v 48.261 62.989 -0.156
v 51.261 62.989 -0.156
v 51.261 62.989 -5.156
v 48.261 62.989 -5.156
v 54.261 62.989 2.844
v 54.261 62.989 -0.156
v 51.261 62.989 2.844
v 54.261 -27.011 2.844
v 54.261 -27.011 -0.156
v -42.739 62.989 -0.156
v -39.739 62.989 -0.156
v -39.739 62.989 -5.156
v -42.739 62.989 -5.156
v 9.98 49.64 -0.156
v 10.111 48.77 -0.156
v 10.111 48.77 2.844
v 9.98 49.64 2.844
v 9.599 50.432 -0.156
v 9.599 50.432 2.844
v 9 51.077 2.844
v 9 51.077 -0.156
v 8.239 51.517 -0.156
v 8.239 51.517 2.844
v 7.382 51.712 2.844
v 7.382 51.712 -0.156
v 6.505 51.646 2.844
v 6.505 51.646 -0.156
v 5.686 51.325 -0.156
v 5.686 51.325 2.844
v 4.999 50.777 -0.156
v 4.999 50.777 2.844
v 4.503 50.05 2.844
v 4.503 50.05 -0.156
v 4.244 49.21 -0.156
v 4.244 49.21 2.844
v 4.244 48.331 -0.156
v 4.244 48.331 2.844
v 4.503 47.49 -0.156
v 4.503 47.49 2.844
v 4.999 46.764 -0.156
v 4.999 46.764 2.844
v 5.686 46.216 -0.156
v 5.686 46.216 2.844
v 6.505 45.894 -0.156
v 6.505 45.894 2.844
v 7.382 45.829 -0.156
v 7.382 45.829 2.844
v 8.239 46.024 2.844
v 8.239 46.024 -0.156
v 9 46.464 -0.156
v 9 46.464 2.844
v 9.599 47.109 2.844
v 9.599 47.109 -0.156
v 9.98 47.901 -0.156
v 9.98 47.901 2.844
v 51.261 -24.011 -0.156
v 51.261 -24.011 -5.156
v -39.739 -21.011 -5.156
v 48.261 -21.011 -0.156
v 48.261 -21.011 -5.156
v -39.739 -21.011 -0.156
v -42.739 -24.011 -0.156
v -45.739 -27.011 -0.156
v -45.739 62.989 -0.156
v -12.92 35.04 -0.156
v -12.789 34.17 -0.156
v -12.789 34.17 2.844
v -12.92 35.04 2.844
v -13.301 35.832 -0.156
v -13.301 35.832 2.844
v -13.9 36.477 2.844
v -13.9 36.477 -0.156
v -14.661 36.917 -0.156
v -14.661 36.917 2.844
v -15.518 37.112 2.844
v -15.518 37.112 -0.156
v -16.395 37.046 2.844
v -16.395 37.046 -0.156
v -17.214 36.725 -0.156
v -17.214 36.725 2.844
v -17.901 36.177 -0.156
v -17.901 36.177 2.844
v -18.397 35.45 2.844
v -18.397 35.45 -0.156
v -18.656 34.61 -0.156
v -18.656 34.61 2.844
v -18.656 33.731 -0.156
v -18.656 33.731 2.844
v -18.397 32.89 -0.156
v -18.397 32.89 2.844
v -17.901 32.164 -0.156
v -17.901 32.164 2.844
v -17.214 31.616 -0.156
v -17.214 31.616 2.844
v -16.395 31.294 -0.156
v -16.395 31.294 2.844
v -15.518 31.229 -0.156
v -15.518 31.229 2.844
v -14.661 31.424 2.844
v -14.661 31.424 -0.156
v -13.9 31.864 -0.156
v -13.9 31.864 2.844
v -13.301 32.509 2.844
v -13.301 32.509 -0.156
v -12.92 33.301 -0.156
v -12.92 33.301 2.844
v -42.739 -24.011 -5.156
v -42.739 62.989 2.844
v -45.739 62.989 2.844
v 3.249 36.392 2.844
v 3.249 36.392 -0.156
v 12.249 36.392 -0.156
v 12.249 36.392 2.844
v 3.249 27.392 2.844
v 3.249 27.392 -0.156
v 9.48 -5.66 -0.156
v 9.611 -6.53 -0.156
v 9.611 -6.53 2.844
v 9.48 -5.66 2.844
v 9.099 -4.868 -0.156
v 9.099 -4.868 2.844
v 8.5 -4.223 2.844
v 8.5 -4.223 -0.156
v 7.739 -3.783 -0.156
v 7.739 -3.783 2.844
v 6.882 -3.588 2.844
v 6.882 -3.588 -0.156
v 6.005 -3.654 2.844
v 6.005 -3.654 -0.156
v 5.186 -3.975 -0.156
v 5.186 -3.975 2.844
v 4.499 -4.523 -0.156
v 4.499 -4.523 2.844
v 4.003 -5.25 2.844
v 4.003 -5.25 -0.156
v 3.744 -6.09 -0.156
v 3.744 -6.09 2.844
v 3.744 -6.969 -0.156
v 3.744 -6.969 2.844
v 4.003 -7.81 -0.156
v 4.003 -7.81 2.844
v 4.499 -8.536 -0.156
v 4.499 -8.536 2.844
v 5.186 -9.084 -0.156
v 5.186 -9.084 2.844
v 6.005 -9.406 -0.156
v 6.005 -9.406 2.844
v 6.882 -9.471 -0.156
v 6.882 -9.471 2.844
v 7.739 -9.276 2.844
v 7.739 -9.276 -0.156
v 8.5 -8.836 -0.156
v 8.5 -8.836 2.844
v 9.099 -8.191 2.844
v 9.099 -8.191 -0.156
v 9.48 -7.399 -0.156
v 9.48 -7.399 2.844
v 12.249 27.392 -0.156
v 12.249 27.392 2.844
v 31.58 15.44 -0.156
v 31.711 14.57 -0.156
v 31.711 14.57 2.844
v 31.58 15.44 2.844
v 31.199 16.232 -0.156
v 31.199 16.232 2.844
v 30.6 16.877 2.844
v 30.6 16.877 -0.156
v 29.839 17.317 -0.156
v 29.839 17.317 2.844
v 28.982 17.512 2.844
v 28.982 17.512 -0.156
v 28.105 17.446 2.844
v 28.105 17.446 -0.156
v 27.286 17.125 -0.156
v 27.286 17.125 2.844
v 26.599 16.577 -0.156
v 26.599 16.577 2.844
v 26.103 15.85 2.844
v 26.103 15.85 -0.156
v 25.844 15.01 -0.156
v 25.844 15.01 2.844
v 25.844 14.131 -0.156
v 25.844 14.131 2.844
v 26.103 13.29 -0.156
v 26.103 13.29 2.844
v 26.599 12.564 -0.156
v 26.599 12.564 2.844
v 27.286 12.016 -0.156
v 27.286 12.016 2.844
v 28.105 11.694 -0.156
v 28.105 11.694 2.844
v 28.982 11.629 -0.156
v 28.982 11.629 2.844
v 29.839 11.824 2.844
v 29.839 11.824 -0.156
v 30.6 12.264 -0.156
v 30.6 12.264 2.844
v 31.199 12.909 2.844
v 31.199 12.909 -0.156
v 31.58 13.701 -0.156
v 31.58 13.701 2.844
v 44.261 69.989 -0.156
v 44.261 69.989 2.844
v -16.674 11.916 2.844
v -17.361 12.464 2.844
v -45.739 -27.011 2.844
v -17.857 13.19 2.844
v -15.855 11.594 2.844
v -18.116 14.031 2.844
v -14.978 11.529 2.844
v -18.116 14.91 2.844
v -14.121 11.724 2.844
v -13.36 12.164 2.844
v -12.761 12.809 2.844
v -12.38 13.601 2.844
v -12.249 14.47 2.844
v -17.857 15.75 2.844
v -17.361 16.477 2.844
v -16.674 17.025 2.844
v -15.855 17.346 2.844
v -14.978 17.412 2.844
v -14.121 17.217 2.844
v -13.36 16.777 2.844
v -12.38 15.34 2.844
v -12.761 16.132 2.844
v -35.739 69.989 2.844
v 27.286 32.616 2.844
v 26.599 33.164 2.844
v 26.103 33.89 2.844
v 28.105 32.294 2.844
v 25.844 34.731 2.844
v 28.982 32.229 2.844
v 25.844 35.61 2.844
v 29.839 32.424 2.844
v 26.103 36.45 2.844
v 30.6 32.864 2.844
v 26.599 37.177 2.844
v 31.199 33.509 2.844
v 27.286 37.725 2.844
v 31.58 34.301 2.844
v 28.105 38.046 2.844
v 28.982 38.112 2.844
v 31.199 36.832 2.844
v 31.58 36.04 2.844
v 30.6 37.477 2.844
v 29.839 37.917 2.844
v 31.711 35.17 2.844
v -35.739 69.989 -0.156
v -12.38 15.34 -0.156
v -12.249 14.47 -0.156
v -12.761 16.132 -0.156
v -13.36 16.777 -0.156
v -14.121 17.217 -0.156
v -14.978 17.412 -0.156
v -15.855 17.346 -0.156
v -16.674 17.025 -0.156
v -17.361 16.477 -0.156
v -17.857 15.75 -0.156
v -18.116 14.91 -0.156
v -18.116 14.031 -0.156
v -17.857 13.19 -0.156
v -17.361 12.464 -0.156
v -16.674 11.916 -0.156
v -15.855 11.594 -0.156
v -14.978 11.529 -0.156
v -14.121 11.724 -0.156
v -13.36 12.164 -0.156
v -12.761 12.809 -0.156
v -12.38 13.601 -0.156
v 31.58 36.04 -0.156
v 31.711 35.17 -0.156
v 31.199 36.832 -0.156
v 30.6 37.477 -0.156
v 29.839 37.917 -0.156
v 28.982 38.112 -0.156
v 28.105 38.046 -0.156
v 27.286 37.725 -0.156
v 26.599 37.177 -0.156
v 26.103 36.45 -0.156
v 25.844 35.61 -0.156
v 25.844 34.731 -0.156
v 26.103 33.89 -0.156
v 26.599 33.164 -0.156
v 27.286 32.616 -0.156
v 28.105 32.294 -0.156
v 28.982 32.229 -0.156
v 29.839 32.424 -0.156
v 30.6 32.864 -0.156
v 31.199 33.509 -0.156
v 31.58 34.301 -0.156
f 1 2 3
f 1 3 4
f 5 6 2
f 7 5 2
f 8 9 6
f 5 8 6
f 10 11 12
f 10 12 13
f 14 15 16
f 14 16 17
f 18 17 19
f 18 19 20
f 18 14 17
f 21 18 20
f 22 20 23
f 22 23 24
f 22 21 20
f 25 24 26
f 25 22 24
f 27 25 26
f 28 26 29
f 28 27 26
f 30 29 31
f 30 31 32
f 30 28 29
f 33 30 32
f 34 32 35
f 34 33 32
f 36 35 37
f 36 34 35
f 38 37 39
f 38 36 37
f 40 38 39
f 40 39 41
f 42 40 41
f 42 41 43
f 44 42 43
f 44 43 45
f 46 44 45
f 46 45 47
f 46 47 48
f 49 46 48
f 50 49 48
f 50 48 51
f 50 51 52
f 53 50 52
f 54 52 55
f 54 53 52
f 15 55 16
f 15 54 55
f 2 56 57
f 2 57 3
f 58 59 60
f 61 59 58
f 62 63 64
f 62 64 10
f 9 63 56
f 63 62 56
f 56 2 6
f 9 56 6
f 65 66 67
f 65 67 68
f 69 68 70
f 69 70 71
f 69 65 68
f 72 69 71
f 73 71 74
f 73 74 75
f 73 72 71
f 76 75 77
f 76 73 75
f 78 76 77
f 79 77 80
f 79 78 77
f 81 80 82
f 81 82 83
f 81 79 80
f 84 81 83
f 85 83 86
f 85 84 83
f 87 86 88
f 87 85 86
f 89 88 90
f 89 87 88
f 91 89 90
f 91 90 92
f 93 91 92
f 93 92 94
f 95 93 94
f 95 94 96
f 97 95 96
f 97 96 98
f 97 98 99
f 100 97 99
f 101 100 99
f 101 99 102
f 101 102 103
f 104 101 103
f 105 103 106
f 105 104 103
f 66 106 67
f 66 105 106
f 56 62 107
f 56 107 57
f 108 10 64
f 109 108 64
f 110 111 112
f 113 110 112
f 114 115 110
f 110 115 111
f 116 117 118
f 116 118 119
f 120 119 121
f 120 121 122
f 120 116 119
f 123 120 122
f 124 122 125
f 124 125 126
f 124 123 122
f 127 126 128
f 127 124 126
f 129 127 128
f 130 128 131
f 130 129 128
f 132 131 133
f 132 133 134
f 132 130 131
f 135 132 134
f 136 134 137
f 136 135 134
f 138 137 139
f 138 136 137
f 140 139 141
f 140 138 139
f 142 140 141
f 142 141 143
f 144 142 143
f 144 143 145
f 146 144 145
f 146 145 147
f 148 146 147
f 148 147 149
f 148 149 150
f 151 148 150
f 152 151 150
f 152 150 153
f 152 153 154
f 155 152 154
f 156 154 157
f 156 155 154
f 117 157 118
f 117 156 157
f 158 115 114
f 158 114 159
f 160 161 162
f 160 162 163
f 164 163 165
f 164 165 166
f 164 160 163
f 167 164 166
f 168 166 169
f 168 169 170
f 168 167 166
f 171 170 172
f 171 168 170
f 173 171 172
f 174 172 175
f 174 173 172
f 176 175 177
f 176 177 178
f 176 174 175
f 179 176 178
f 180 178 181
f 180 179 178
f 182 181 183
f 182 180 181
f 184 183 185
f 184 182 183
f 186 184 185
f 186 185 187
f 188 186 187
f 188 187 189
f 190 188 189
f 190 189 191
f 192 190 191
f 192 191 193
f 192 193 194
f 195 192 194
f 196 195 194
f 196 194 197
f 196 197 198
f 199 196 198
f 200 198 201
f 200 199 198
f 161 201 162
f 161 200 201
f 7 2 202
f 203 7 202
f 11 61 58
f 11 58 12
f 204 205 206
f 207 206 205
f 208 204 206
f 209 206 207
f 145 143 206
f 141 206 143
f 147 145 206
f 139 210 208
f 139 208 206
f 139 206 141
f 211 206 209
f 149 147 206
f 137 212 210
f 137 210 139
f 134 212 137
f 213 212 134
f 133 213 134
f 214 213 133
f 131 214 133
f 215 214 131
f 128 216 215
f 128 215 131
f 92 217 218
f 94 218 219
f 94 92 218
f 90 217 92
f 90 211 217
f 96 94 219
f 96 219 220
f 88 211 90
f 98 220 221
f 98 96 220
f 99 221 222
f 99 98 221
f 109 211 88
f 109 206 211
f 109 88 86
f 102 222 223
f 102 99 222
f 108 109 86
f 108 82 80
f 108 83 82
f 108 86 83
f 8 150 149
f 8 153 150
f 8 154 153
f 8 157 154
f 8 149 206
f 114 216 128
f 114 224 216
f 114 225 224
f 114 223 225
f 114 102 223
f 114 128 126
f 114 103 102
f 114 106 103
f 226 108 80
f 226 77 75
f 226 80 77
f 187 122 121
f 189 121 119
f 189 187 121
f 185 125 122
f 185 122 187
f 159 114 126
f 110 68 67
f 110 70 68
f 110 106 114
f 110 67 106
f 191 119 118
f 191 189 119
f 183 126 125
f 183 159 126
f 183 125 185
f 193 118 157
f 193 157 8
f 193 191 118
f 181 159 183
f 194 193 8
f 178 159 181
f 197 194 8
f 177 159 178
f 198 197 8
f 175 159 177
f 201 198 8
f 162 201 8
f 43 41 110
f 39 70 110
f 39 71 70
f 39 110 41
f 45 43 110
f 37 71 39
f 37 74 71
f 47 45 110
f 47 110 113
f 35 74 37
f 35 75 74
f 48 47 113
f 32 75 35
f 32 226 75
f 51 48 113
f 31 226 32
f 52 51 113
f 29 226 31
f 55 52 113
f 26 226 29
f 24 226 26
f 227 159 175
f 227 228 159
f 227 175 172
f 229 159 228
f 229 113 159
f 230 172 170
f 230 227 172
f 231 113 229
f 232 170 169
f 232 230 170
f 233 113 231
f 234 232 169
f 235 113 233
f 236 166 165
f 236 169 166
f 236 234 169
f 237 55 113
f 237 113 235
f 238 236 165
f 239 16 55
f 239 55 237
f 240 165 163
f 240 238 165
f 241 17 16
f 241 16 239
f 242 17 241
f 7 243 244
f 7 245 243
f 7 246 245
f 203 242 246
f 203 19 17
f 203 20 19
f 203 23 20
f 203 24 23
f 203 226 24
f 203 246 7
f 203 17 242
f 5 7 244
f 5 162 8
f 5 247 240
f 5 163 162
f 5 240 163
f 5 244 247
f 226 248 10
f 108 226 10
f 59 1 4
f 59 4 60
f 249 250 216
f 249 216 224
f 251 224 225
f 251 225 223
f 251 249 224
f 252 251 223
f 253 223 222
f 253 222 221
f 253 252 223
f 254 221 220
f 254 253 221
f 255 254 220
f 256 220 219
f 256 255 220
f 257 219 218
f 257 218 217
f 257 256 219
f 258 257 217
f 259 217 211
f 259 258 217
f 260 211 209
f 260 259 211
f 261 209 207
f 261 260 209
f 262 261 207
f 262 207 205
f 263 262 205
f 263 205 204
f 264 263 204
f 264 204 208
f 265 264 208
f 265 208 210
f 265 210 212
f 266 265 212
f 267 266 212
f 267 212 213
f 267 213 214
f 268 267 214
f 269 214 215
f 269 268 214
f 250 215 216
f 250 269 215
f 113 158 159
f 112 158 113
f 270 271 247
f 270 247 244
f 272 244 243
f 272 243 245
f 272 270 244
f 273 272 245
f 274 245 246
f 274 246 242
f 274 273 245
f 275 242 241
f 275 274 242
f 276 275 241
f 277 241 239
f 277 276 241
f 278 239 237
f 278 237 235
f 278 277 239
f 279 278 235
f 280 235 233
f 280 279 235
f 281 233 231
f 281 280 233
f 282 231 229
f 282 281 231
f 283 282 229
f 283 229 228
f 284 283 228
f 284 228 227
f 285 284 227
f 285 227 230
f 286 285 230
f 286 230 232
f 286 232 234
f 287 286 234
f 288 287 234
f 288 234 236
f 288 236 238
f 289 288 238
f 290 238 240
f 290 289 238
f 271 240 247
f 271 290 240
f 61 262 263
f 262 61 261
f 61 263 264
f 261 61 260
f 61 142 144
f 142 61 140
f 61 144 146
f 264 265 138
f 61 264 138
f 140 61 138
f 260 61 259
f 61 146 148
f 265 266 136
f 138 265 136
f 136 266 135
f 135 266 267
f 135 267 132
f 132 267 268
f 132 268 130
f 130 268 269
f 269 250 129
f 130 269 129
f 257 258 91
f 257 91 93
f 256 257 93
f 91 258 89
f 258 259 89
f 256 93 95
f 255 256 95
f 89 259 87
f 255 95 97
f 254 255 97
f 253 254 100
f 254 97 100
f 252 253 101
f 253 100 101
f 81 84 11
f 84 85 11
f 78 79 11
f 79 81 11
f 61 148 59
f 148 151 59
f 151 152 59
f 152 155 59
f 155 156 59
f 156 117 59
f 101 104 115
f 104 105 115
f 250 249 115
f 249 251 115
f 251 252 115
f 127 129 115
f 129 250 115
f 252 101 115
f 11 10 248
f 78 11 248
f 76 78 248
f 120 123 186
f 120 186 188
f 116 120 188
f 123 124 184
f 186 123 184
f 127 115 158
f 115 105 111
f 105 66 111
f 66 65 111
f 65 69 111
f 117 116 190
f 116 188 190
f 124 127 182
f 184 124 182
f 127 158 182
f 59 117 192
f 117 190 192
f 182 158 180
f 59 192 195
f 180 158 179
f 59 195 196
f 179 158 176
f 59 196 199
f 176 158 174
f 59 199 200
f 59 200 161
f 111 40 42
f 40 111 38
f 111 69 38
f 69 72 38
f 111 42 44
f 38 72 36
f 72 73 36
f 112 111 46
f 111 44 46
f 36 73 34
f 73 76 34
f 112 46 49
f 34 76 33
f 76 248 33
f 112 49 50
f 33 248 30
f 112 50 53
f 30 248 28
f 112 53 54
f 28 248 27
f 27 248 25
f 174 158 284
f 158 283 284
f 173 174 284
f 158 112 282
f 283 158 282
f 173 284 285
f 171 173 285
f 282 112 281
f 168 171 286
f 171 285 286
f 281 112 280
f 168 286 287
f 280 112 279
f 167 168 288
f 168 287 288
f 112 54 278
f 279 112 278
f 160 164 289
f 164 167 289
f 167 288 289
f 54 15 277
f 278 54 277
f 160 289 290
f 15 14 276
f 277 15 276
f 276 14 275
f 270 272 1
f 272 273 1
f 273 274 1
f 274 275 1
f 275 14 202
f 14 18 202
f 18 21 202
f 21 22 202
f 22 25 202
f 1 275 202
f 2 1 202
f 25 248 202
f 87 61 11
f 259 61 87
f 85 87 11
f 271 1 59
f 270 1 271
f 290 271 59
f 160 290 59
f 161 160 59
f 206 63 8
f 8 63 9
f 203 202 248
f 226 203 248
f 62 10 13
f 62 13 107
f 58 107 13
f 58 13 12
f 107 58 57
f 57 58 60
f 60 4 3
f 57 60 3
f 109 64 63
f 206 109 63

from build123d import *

# Parameters (mm, degrees)
CROQUIS1_R              = 2.950001172
CROQUIS1_W              = 9
CROQUIS1_H              = 9
SALIENTE_EXTRUIR1_DEPTH = 3
SALIENTE_EXTRUIR6_DEPTH = 5


with BuildPart() as part:
    # Croquis1 → Saliente-Extruir1 (new body)
    with BuildSketch(Plane.XY.offset(-0.156260387)):
        Polygon((51.261125499, 62.988673094), (44.261125499, 69.988673094), (-35.738874501, 69.988673094), (-42.738874501, 62.988673094), (-45.738874501, 62.988673094), (-45.738874501, -27.011326906), (54.261125499, -27.011326906), (54.261125499, 62.988673094), align=None)
        with Locations((7.161124531, 48.770443145)):
            Circle(CROQUIS1_R, mode=Mode.SUBTRACT)
        with Locations((28.761125092, 35.170443896)):
            Circle(CROQUIS1_R, mode=Mode.SUBTRACT)
        with Locations((28.761125092, 14.5704435)):
            Circle(CROQUIS1_R, mode=Mode.SUBTRACT)
        with Locations((6.661127243, -6.529559074)):
            Circle(CROQUIS1_R, mode=Mode.SUBTRACT)
        with Locations((-15.198872503, 14.470443669)):
            Circle(CROQUIS1_R, mode=Mode.SUBTRACT)
        with Locations((-15.738875683, 34.170445595)):
            Circle(CROQUIS1_R, mode=Mode.SUBTRACT)
        with Locations((7.748576734, 31.892113927)):
            Rectangle(CROQUIS1_W, CROQUIS1_H, mode=Mode.SUBTRACT)
    extrude(amount=SALIENTE_EXTRUIR1_DEPTH)

    # Croquis9 → Saliente-Extruir6 (add)
    with BuildSketch(Plane(origin=(0, 0, -0.156260387), x_dir=(-1, 0, 0), z_dir=(0, 0, -1))):
        Polygon((-51.261125499, 62.988673094), (-48.261125499, 62.988673094), (-48.261125499, -21.011326906), (39.738874501, -21.011326906), (39.738874501, 62.988673094), (42.738874501, 62.988673094), (42.738874501, -24.011326906), (-51.261125499, -24.011326906), align=None)
    extrude(amount=SALIENTE_EXTRUIR6_DEPTH)


solid = part.part
